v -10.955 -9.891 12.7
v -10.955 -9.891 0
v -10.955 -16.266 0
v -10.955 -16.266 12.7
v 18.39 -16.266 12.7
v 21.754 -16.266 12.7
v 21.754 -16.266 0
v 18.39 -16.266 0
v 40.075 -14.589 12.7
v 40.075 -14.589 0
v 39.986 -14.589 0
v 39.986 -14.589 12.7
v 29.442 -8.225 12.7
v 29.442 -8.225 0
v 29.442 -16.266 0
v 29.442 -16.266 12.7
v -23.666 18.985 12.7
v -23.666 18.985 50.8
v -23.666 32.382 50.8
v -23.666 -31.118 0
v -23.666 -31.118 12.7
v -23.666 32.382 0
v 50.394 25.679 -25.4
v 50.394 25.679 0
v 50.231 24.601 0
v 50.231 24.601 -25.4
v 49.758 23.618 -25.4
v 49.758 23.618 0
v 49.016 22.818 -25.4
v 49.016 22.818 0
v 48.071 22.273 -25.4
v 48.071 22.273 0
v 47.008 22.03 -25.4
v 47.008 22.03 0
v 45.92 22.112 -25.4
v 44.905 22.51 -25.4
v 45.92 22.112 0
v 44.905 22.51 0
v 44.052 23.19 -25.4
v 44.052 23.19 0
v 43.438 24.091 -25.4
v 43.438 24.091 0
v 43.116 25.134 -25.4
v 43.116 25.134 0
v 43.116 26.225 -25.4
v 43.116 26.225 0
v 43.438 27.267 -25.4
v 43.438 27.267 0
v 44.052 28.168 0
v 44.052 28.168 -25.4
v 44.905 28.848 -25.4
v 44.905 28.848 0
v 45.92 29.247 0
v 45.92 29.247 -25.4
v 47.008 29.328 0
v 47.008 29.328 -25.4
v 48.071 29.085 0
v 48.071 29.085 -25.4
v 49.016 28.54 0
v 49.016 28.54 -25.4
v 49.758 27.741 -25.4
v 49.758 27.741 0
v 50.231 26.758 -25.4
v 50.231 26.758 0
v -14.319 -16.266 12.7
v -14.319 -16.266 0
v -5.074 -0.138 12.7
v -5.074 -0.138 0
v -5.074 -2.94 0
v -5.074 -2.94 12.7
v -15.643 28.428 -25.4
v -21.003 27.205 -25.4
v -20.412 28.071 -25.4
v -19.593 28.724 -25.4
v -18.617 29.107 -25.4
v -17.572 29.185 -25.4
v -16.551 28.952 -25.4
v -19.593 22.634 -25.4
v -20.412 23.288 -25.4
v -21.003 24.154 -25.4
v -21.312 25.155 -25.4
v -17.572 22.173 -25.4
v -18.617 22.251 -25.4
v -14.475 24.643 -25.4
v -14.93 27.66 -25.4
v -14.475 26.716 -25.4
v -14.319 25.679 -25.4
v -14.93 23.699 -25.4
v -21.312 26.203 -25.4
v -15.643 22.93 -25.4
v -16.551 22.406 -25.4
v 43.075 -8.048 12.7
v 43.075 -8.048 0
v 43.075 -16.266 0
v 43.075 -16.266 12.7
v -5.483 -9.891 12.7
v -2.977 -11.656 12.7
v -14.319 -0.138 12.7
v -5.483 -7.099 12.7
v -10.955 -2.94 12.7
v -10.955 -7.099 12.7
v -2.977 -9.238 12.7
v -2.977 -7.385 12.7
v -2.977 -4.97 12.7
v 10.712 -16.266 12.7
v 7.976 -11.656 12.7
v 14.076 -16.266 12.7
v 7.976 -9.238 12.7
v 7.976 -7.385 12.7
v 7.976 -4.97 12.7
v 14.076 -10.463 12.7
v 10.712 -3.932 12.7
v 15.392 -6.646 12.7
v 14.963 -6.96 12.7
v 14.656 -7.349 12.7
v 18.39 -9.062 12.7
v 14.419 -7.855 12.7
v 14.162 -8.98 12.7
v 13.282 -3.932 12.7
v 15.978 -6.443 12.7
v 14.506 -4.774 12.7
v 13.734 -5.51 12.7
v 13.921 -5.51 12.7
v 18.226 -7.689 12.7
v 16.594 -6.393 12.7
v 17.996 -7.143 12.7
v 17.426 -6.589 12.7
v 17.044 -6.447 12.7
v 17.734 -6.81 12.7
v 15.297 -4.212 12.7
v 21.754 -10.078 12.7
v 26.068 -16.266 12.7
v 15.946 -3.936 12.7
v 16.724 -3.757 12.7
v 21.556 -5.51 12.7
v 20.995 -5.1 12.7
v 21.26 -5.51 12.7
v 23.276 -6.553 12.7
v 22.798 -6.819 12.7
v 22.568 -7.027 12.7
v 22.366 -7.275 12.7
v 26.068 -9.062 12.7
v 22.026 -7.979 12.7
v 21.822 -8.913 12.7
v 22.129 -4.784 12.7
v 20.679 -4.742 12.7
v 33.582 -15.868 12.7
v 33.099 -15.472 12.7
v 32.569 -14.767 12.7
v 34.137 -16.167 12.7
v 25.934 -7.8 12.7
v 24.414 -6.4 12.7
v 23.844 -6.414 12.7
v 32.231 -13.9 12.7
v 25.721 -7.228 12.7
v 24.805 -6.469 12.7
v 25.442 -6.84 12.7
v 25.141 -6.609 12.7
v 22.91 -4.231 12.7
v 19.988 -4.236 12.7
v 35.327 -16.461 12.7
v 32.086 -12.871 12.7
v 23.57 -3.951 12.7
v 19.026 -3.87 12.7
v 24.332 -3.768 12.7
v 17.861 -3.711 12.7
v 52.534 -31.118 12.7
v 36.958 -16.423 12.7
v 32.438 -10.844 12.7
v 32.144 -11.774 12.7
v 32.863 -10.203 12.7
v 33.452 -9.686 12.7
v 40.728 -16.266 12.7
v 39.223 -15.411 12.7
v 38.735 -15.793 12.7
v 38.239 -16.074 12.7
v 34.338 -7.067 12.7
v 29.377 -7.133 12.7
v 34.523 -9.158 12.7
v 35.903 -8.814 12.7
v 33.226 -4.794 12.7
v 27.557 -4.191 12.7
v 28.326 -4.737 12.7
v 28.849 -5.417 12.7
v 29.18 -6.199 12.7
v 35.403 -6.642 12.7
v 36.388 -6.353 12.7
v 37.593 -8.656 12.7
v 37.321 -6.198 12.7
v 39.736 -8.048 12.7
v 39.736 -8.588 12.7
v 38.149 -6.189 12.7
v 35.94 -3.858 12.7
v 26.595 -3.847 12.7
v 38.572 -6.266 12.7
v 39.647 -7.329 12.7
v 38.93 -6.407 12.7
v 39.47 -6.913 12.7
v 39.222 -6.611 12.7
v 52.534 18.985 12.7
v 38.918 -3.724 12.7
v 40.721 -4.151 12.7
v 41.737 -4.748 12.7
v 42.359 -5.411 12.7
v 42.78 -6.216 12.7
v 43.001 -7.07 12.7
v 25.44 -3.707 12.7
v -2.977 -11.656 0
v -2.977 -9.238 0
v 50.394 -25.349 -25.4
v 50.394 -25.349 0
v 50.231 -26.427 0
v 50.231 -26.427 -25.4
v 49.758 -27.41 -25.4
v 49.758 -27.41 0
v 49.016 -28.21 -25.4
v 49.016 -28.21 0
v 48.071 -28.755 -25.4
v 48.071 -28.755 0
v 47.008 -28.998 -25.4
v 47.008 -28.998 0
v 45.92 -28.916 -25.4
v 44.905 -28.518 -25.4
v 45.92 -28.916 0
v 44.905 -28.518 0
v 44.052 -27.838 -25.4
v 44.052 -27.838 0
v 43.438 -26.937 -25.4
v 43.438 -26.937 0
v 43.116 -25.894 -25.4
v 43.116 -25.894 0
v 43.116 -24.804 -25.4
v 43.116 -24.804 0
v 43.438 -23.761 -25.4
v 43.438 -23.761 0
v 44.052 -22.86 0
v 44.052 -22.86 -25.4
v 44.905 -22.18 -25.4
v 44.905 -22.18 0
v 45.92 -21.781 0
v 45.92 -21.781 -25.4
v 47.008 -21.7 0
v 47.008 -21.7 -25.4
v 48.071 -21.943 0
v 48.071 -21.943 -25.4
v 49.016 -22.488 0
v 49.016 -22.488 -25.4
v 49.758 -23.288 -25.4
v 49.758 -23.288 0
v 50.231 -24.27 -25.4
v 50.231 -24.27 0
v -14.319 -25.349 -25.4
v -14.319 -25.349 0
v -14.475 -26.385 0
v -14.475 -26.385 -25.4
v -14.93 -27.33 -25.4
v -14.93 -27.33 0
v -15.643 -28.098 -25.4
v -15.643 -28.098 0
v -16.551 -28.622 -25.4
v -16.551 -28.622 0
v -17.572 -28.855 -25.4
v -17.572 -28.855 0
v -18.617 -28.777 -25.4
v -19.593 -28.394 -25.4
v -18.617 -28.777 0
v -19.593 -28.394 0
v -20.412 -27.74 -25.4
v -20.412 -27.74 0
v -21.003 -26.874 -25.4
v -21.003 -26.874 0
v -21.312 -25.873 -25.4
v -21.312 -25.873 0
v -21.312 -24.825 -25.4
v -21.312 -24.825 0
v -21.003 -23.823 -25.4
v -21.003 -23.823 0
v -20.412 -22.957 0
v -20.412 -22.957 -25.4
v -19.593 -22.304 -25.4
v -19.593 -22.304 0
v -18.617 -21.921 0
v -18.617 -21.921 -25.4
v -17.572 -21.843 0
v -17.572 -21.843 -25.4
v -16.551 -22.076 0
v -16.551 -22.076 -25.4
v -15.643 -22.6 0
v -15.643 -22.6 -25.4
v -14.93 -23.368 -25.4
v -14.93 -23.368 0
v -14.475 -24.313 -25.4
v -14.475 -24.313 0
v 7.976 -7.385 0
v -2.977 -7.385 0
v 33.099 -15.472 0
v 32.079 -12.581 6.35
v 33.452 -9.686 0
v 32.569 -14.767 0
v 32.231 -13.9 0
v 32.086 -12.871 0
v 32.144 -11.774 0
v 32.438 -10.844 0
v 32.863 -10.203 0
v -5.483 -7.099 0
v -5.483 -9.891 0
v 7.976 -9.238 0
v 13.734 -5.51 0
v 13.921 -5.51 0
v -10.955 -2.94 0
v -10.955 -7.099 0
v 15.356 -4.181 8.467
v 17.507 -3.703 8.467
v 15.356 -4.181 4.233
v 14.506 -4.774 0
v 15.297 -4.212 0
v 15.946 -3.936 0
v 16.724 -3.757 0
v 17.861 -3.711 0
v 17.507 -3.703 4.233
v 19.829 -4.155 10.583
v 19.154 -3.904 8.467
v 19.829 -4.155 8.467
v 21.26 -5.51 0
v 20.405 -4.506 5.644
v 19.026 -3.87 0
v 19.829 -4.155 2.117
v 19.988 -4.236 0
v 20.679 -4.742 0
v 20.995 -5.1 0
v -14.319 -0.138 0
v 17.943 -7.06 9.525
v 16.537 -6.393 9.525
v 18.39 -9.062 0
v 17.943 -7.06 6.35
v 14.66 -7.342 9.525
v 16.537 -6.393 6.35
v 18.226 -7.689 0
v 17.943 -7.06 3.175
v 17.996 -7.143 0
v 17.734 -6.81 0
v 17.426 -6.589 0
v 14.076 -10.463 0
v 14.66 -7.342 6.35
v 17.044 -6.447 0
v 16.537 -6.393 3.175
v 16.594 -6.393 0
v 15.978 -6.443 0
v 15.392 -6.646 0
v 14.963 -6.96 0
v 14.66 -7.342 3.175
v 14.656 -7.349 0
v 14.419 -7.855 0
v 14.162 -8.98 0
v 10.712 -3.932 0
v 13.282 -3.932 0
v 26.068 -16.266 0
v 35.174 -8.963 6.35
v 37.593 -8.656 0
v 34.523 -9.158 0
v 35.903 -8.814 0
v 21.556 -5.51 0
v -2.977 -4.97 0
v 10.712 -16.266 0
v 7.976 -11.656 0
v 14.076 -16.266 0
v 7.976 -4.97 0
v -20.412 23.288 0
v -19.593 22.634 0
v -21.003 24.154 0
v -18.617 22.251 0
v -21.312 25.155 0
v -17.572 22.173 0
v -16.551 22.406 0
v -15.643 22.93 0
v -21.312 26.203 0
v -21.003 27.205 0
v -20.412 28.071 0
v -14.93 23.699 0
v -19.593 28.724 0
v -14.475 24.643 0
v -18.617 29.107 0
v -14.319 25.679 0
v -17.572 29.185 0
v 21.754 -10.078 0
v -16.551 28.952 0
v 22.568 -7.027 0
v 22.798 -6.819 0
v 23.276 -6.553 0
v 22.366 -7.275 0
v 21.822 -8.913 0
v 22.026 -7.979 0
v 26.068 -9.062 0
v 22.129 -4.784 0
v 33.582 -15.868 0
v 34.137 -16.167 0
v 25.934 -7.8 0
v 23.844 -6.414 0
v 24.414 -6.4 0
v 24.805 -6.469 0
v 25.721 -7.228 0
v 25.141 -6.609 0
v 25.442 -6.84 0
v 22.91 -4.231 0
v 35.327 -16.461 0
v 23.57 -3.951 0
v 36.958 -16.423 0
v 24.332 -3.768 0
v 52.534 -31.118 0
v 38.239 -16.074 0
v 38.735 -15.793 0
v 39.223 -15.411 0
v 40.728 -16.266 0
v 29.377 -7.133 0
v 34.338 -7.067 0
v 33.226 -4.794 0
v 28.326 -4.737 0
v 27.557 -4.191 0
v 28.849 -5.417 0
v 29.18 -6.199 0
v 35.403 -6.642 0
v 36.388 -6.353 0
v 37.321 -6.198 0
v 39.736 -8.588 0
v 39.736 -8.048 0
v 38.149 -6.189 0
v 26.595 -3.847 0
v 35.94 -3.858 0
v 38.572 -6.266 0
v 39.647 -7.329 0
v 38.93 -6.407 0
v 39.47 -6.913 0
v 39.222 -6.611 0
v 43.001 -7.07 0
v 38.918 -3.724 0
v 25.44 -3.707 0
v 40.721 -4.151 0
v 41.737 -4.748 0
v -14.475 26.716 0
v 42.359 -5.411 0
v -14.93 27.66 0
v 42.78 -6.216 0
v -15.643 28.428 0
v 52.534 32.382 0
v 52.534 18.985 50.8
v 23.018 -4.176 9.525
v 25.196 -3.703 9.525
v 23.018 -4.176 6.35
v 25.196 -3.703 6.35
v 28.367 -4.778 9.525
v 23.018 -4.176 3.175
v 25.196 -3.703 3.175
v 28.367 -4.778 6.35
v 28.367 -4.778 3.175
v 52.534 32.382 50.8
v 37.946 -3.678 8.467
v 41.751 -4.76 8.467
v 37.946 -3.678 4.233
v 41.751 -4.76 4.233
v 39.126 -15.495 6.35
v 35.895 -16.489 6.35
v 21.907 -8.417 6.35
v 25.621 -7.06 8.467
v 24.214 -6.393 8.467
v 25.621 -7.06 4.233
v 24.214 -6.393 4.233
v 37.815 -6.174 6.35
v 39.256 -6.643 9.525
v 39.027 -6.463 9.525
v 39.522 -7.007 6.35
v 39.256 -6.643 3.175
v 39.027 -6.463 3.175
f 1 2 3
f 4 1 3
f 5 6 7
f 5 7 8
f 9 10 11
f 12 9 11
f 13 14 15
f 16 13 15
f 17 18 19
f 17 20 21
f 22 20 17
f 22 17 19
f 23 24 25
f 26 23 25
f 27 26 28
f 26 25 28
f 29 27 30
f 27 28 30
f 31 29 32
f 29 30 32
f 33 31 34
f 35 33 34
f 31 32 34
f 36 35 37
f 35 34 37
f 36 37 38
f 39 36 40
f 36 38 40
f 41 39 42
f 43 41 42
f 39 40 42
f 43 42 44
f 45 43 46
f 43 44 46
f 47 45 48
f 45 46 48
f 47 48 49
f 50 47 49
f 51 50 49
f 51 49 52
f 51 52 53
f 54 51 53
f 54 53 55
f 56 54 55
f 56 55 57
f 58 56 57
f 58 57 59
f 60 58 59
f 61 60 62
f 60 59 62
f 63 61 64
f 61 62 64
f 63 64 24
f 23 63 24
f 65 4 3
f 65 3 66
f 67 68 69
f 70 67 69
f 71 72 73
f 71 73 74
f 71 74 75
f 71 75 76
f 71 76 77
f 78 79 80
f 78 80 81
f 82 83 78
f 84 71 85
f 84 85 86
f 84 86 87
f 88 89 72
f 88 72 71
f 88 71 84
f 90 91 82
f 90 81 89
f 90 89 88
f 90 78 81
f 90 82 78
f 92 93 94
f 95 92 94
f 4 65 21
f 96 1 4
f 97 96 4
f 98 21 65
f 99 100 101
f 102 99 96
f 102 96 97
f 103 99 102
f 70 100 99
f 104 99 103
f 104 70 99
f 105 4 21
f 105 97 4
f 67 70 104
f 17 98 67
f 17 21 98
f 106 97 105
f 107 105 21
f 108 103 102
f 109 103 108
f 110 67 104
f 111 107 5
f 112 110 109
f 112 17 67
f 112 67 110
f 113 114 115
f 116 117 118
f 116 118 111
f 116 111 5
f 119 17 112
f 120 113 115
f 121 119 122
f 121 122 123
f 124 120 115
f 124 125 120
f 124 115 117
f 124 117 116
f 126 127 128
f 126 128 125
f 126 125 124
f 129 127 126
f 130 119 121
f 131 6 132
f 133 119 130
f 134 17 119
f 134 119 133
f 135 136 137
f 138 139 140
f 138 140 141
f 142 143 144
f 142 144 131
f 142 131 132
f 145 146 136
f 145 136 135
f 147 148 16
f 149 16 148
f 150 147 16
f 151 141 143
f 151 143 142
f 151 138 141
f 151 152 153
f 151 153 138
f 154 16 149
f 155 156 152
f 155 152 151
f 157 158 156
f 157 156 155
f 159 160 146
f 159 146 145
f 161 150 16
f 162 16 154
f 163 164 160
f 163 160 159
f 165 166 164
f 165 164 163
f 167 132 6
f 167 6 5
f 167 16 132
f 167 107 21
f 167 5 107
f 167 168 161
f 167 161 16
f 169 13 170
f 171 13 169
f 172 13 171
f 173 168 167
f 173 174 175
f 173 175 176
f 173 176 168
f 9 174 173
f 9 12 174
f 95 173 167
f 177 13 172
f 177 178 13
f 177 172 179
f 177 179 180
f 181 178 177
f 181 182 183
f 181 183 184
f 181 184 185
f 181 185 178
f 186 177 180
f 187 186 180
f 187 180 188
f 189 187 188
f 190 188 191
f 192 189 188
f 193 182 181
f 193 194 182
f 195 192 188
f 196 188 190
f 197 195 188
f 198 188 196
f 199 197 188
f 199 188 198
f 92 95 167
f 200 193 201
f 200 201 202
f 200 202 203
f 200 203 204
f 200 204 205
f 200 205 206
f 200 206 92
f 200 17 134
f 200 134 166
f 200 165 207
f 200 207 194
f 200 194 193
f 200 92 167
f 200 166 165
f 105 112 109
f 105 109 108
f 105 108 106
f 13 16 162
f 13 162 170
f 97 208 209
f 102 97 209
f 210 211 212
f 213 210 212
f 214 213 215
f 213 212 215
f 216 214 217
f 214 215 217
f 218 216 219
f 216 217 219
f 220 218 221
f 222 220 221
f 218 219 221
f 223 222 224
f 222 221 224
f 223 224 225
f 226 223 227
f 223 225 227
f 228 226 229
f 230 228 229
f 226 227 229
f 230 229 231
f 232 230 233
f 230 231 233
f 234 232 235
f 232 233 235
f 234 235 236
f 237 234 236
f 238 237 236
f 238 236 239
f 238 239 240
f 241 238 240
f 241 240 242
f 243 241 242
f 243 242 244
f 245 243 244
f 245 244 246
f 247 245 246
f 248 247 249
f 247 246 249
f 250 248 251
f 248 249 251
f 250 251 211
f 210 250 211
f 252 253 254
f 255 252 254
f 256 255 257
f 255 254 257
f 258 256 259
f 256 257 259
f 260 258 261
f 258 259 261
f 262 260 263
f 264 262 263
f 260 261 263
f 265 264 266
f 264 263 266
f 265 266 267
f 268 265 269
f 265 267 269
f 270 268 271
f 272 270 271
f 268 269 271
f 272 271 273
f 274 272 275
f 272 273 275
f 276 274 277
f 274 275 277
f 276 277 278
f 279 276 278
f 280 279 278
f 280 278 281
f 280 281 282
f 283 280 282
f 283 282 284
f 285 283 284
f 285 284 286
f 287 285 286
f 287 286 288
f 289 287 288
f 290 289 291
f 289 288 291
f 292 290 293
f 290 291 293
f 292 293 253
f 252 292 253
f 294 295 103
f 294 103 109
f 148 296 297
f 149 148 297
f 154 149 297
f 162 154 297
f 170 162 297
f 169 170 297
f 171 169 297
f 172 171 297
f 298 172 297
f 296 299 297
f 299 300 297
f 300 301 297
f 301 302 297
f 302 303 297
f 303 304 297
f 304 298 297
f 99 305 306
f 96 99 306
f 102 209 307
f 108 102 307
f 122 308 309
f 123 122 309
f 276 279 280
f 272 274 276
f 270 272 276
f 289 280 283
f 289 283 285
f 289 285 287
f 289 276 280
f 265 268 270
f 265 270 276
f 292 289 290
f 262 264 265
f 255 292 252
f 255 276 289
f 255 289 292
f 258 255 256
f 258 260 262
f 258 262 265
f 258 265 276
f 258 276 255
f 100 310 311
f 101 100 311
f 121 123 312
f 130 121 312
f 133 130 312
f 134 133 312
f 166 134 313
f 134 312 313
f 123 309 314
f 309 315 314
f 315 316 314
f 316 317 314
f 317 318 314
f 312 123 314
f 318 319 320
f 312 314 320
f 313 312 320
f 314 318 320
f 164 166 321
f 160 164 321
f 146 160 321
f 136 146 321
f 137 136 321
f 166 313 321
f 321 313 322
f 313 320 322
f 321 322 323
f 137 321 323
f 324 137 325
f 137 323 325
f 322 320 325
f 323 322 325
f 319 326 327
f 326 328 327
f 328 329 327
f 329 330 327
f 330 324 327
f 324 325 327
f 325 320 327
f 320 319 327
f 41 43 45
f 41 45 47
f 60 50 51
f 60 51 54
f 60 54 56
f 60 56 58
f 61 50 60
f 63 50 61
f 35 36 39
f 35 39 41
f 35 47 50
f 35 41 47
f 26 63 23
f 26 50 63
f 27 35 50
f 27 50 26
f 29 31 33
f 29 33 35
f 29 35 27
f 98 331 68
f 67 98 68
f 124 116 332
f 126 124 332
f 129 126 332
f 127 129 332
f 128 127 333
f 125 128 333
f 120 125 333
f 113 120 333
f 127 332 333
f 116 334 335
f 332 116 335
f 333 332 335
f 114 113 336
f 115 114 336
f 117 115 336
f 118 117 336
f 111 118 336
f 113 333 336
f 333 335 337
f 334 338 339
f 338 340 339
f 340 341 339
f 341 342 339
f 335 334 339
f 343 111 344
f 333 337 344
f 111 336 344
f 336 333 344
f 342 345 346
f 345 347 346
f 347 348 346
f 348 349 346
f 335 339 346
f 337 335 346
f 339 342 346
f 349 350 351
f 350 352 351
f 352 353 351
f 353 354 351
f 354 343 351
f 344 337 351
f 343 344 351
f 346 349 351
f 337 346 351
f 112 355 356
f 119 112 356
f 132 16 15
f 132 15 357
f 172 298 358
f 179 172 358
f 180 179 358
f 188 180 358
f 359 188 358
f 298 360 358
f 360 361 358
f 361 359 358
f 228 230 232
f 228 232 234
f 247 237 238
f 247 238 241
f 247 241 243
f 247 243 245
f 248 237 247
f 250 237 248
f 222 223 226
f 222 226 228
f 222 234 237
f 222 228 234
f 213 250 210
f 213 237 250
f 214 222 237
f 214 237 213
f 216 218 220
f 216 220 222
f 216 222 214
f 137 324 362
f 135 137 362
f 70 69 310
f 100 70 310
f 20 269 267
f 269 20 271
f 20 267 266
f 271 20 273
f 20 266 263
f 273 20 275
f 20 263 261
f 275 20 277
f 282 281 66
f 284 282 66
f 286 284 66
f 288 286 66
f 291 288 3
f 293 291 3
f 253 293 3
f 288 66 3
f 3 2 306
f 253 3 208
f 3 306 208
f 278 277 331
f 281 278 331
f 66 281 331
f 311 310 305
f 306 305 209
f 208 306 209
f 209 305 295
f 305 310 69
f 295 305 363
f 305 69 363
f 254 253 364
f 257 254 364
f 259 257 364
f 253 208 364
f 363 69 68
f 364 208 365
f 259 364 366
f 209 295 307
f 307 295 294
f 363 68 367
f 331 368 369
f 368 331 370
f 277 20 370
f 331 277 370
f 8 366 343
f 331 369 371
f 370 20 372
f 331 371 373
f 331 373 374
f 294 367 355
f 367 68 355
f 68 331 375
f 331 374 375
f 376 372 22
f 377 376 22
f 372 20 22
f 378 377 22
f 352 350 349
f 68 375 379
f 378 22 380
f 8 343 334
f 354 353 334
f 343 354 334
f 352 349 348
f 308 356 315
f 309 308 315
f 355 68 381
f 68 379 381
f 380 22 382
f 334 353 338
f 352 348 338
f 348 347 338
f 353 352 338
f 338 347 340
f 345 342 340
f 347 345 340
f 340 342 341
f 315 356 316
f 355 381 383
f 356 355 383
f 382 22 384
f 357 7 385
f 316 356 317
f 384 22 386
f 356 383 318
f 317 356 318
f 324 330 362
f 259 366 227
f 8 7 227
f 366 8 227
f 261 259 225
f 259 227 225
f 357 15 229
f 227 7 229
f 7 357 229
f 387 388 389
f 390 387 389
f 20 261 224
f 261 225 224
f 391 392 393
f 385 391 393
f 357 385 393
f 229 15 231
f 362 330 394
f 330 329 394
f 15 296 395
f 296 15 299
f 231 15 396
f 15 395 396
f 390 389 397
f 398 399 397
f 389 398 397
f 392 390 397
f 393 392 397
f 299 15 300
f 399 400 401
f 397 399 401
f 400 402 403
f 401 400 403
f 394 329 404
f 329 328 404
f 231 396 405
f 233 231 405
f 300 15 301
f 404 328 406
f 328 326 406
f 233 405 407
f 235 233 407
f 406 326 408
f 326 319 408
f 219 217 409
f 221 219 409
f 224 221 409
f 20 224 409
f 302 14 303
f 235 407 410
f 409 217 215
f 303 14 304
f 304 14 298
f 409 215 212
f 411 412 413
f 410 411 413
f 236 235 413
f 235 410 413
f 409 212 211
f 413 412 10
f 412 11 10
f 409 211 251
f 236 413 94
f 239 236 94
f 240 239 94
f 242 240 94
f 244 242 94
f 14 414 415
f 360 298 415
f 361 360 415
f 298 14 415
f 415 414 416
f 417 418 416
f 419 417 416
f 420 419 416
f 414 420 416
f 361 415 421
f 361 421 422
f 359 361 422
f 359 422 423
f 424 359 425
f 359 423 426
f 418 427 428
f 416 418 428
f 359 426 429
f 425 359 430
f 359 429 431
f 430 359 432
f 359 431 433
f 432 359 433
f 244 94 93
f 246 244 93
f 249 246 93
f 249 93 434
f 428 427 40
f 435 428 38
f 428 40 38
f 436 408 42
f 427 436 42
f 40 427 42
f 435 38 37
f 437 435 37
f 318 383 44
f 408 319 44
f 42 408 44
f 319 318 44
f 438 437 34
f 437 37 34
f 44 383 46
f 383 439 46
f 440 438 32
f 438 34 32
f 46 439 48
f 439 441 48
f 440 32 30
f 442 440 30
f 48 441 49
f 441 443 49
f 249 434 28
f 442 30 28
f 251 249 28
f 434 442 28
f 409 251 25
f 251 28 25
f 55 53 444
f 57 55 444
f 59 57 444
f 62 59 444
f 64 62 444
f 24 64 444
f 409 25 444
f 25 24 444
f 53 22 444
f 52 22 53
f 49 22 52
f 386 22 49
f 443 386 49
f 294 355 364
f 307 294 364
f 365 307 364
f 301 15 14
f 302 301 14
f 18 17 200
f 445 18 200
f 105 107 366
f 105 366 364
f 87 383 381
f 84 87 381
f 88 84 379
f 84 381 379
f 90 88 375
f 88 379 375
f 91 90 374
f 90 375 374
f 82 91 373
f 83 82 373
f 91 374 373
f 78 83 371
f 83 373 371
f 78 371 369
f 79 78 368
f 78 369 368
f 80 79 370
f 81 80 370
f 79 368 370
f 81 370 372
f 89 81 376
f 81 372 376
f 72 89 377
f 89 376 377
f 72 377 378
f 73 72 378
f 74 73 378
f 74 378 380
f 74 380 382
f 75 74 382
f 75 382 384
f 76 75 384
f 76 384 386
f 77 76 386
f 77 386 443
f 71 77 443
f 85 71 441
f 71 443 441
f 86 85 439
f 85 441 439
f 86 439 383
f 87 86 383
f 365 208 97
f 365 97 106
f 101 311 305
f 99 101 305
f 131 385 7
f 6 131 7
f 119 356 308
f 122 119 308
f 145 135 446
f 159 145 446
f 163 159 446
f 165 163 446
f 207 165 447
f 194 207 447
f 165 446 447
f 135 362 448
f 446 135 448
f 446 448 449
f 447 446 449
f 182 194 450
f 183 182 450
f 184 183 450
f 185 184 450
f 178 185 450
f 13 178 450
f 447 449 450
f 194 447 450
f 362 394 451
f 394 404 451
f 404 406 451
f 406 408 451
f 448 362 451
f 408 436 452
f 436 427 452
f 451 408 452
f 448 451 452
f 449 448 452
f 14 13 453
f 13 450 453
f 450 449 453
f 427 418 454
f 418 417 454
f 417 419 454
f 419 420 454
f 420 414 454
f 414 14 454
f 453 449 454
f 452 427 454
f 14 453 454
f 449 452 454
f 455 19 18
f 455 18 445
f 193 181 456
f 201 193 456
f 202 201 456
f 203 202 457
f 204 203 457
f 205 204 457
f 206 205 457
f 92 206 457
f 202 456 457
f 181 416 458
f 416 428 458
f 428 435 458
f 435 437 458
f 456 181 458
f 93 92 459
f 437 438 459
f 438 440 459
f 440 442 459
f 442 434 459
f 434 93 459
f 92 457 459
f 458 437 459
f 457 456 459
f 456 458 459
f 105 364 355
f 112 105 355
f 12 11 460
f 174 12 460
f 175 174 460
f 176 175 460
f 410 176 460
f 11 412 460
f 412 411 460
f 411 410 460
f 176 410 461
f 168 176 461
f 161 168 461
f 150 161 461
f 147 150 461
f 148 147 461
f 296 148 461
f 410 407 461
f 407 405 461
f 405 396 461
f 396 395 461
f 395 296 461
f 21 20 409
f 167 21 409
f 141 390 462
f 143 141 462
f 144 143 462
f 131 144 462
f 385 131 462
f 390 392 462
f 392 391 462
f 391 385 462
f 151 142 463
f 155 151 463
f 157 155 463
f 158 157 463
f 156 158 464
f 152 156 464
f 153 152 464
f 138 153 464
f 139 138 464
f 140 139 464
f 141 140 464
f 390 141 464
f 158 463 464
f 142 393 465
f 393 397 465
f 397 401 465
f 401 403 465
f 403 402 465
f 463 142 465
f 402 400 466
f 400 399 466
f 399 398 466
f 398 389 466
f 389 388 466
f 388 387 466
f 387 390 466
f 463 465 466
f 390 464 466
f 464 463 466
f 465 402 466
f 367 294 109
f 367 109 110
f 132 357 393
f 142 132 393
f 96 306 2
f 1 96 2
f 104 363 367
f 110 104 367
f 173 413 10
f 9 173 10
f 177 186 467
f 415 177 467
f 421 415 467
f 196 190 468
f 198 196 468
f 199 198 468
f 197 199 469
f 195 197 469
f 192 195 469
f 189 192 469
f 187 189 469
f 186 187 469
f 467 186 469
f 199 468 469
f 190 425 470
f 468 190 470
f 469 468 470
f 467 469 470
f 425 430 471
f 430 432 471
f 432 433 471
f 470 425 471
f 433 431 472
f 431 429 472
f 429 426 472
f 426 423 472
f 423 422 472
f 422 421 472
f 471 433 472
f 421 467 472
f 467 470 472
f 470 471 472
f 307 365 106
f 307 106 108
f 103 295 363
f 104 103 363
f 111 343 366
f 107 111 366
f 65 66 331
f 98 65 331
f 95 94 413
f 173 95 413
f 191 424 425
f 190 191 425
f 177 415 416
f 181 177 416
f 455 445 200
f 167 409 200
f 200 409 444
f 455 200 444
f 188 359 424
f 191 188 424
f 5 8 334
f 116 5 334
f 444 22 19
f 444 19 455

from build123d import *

# Parameters (mm, degrees)
F0_W     = 76.2
F0_H     = 63.5
F0_W_2   = 10.9535785814
F0_H_2   = 2.4180474793
F0_H_3   = 2.414517483
F1_DEPTH = 12.7
F2_W     = 76.2
F2_H     = 13.3969295336
F3_DEPTH = 38.1
F4_R     = 3.6592600081
F4_R_2   = 3.5160030893
F5_DEPTH = 25.4


with BuildPart() as f1:
    # F0 (on Top) → F1 (new body)
    with BuildSketch(Plane.XY):
        with Locations((14.4339624465, 0.632009135)):
            Rectangle(F0_W, F0_H)
        Polygon((-10.9549575136, -9.891049689), (-10.9549575136, -16.2662230432), (-14.3190440067, -16.2662230432), (-14.3190440067, -0.1376698565), (-5.0739836443, -0.1376698565), (-5.0739836443, -2.9404869347), (-10.9549575136, -2.9404869347), (-10.9549575136, -7.0988225998), (-5.4834632174, -7.0988225998), (-5.4834632174, -9.891049689), align=None, mode=Mode.SUBTRACT)
        with Locations((2.4996234606, -10.4470241095)):
            Rectangle(F0_W_2, F0_H_2, mode=Mode.SUBTRACT)
        with Locations((2.4996234606, -6.1774935602)):
            Rectangle(F0_W_2, F0_H_3, mode=Mode.SUBTRACT)
        with BuildLine():
            Line((21.7539883888, -10.078139494), (21.7539883888, -16.2662230432))
            Line((21.7539883888, -16.2662230432), (18.3899018957, -16.2662230432))
            Line((18.3899018957, -16.2662230432), (18.3899018957, -9.0615005538))
            add(Edge.make_bspline(
                [(18.3899018957, -9.0615005538), (18.3899018957, -7.7271619448), (17.9433573612, -7.0599926403)],
                knots=[0, 0, 0, 1, 1, 1], degree=2))
            add(Edge.make_bspline(
                [(17.9433573612, -7.0599926403), (17.4968128267, -6.3928233358), (16.5366538276, -6.3928233358)],
                knots=[0, 0, 0, 1, 1, 1], degree=2))
            add(Edge.make_bspline(
                [(16.5366538276, -6.3928233358), (15.2446751745, -6.3928233358), (14.6604607835, -7.3423923459)],
                knots=[0, 0, 0, 1, 1, 1], degree=2))
            add(Edge.make_bspline(
                [(14.6604607835, -7.3423923459), (14.0762463925, -8.291961356), (14.0762463925, -10.4629090929)],
                knots=[0, 0, 0, 1, 1, 1], degree=2))
            Line((14.0762463925, -10.4629090929), (14.0762463925, -16.2662230432))
            Line((14.0762463925, -16.2662230432), (10.7121598994, -16.2662230432))
            Line((10.7121598994, -16.2662230432), (10.7121598994, -3.9324159006))
            Line((10.7121598994, -3.9324159006), (13.2819972205, -3.9324159006))
            Line((13.2819972205, -3.9324159006), (13.7338367495, -5.5103242557))
            Line((13.7338367495, -5.5103242557), (13.9209265544, -5.5103242557))
            add(Edge.make_bspline(
                [(13.9209265544, -5.5103242557), (14.4186560356, -4.6595951426), (15.3558700586, -4.1812806412)],
                knots=[0, 0, 0, 1, 1, 1], degree=2))
            add(Edge.make_bspline(
                [(15.3558700586, -4.1812806412), (16.2930840816, -3.7029661398), (17.5074028157, -3.7029661398)],
                knots=[0, 0, 0, 1, 1, 1], degree=2))
            add(Edge.make_bspline(
                [(17.5074028157, -3.7029661398), (20.2749199307, -3.7029661398), (21.259788904, -5.5103242557)],
                knots=[0, 0, 0, 1, 1, 1], degree=2))
            Line((21.259788904, -5.5103242557), (21.5563085949, -5.5103242557))
            add(Edge.make_bspline(
                [(21.5563085949, -5.5103242557), (22.054038076, -4.6490051536), (23.0177270714, -4.1759856467)],
                knots=[0, 0, 0, 1, 1, 1], degree=2))
            add(Edge.make_bspline(
                [(23.0177270714, -4.1759856467), (23.9814160668, -3.7029661398), (25.1957348009, -3.7029661398)],
                knots=[0, 0, 0, 1, 1, 1], degree=2))
            add(Edge.make_bspline(
                [(25.1957348009, -3.7029661398), (27.2925526151, -3.7029661398), (28.3674364946, -4.7778500193)],
                knots=[0, 0, 0, 1, 1, 1], degree=2))
            add(Edge.make_bspline(
                [(28.3674364946, -4.7778500193), (29.4423203741, -5.8527338988), (29.4423203741, -8.2248914259)],
                knots=[0, 0, 0, 1, 1, 1], degree=2))
            Line((29.4423203741, -8.2248914259), (29.4423203741, -16.2662230432))
            Line((29.4423203741, -16.2662230432), (26.067643892, -16.2662230432))
            Line((26.067643892, -16.2662230432), (26.067643892, -9.0615005538))
            add(Edge.make_bspline(
                [(26.067643892, -9.0615005538), (26.067643892, -7.7271619448), (25.6210993575, -7.0599926403)],
                knots=[0, 0, 0, 1, 1, 1], degree=2))
            add(Edge.make_bspline(
                [(25.6210993575, -7.0599926403), (25.174554823, -6.3928233358), (24.2143958239, -6.3928233358)],
                knots=[0, 0, 0, 1, 1, 1], degree=2))
            add(Edge.make_bspline(
                [(24.2143958239, -6.3928233358), (22.9788971119, -6.3928233358), (22.3664427504, -7.2753224158)],
                knots=[0, 0, 0, 1, 1, 1], degree=2))
            add(Edge.make_bspline(
                [(22.3664427504, -7.2753224158), (21.7539883888, -8.1578214958), (21.7539883888, -10.078139494)],
                knots=[0, 0, 0, 1, 1, 1], degree=2))
        make_face(mode=Mode.SUBTRACT)
        with BuildLine():
            Line((43.0751661625, -16.2662230432), (40.7277186096, -16.2662230432))
            Line((40.7277186096, -16.2662230432), (40.0746692903, -14.5894747911))
            Line((40.0746692903, -14.5894747911), (39.9864193823, -14.5894747911))
            add(Edge.make_bspline(
                [(39.9864193823, -14.5894747911), (39.1392202655, -15.6590636761), (38.2390712039, -16.0738382438)],
                knots=[0, 0, 0, 1, 1, 1], degree=2))
            add(Edge.make_bspline(
                [(38.2390712039, -16.0738382438), (37.3389221422, -16.4886128114), (35.8951536473, -16.4886128114)],
                knots=[0, 0, 0, 1, 1, 1], degree=2))
            add(Edge.make_bspline(
                [(35.8951536473, -16.4886128114), (34.1195654983, -16.4886128114), (33.0993965617, -15.4719738712)],
                knots=[0, 0, 0, 1, 1, 1], degree=2))
            add(Edge.make_bspline(
                [(33.0993965617, -15.4719738712), (32.0792276252, -14.455334931), (32.0792276252, -12.580906885)],
                knots=[0, 0, 0, 1, 1, 1], degree=2))
            add(Edge.make_bspline(
                [(32.0792276252, -12.580906885), (32.0792276252, -10.618228931), (33.4523961938, -9.6863099025)],
                knots=[0, 0, 0, 1, 1, 1], degree=2))
            add(Edge.make_bspline(
                [(33.4523961938, -9.6863099025), (34.8255647623, -8.7543908739), (37.5930818773, -8.655550977)],
                knots=[0, 0, 0, 1, 1, 1], degree=2))
            Line((37.5930818773, -8.655550977), (39.7357896436, -8.5884810469))
            Line((39.7357896436, -8.5884810469), (39.7357896436, -8.0483916099))
            add(Edge.make_bspline(
                [(39.7357896436, -8.0483916099), (39.7357896436, -6.1739635639), (37.8154716454, -6.1739635639)],
                knots=[0, 0, 0, 1, 1, 1], degree=2))
            add(Edge.make_bspline(
                [(37.8154716454, -6.1739635639), (36.3364031873, -6.1739635639), (34.3384252701, -7.0670526329)],
                knots=[0, 0, 0, 1, 1, 1], degree=2))
            Line((34.3384252701, -7.0670526329), (33.2264764293, -4.7937350027))
            add(Edge.make_bspline(
                [(33.2264764293, -4.7937350027), (35.3550642103, -3.6782561656), (37.9460815093, -3.6782561656)],
                knots=[0, 0, 0, 1, 1, 1], degree=2))
            add(Edge.make_bspline(
                [(37.9460815093, -3.6782561656), (40.4276689223, -3.6782561656), (41.7514175424, -4.7602000377)],
                knots=[0, 0, 0, 1, 1, 1], degree=2))
            add(Edge.make_bspline(
                [(41.7514175424, -4.7602000377), (43.0751661625, -5.8421439098), (43.0751661625, -8.0483916099)],
                knots=[0, 0, 0, 1, 1, 1], degree=2))
            Line((43.0751661625, -8.0483916099), (43.0751661625, -16.2662230432))
        make_face(mode=Mode.SUBTRACT)
    extrude(amount=F1_DEPTH)

    # F2 (on face) → F3 (join)
    with BuildSketch(Plane.XY.offset(12.7)):
        with Locations((14.4339624465, 25.6835443682)):
            Rectangle(F2_W, F2_H)
    extrude(amount=F3_DEPTH)

    # F4 (on face) → F5 (join)
    with BuildSketch(Plane(origin=(0, 0, 0), x_dir=(1, 0, 0), z_dir=(0, 0, -1))):
        with Locations((46.7344261706, -25.6791654974)):
            Circle(F4_R)
        with Locations((46.7344261706, 25.3488849849)):
            Circle(F4_R)
        with Locations((-17.835047096, -25.6791654974)):
            Circle(F4_R_2)
        with Locations((-17.835047096, 25.3488849849)):
            Circle(F4_R_2)
    extrude(amount=F5_DEPTH)


solid = f1.part
